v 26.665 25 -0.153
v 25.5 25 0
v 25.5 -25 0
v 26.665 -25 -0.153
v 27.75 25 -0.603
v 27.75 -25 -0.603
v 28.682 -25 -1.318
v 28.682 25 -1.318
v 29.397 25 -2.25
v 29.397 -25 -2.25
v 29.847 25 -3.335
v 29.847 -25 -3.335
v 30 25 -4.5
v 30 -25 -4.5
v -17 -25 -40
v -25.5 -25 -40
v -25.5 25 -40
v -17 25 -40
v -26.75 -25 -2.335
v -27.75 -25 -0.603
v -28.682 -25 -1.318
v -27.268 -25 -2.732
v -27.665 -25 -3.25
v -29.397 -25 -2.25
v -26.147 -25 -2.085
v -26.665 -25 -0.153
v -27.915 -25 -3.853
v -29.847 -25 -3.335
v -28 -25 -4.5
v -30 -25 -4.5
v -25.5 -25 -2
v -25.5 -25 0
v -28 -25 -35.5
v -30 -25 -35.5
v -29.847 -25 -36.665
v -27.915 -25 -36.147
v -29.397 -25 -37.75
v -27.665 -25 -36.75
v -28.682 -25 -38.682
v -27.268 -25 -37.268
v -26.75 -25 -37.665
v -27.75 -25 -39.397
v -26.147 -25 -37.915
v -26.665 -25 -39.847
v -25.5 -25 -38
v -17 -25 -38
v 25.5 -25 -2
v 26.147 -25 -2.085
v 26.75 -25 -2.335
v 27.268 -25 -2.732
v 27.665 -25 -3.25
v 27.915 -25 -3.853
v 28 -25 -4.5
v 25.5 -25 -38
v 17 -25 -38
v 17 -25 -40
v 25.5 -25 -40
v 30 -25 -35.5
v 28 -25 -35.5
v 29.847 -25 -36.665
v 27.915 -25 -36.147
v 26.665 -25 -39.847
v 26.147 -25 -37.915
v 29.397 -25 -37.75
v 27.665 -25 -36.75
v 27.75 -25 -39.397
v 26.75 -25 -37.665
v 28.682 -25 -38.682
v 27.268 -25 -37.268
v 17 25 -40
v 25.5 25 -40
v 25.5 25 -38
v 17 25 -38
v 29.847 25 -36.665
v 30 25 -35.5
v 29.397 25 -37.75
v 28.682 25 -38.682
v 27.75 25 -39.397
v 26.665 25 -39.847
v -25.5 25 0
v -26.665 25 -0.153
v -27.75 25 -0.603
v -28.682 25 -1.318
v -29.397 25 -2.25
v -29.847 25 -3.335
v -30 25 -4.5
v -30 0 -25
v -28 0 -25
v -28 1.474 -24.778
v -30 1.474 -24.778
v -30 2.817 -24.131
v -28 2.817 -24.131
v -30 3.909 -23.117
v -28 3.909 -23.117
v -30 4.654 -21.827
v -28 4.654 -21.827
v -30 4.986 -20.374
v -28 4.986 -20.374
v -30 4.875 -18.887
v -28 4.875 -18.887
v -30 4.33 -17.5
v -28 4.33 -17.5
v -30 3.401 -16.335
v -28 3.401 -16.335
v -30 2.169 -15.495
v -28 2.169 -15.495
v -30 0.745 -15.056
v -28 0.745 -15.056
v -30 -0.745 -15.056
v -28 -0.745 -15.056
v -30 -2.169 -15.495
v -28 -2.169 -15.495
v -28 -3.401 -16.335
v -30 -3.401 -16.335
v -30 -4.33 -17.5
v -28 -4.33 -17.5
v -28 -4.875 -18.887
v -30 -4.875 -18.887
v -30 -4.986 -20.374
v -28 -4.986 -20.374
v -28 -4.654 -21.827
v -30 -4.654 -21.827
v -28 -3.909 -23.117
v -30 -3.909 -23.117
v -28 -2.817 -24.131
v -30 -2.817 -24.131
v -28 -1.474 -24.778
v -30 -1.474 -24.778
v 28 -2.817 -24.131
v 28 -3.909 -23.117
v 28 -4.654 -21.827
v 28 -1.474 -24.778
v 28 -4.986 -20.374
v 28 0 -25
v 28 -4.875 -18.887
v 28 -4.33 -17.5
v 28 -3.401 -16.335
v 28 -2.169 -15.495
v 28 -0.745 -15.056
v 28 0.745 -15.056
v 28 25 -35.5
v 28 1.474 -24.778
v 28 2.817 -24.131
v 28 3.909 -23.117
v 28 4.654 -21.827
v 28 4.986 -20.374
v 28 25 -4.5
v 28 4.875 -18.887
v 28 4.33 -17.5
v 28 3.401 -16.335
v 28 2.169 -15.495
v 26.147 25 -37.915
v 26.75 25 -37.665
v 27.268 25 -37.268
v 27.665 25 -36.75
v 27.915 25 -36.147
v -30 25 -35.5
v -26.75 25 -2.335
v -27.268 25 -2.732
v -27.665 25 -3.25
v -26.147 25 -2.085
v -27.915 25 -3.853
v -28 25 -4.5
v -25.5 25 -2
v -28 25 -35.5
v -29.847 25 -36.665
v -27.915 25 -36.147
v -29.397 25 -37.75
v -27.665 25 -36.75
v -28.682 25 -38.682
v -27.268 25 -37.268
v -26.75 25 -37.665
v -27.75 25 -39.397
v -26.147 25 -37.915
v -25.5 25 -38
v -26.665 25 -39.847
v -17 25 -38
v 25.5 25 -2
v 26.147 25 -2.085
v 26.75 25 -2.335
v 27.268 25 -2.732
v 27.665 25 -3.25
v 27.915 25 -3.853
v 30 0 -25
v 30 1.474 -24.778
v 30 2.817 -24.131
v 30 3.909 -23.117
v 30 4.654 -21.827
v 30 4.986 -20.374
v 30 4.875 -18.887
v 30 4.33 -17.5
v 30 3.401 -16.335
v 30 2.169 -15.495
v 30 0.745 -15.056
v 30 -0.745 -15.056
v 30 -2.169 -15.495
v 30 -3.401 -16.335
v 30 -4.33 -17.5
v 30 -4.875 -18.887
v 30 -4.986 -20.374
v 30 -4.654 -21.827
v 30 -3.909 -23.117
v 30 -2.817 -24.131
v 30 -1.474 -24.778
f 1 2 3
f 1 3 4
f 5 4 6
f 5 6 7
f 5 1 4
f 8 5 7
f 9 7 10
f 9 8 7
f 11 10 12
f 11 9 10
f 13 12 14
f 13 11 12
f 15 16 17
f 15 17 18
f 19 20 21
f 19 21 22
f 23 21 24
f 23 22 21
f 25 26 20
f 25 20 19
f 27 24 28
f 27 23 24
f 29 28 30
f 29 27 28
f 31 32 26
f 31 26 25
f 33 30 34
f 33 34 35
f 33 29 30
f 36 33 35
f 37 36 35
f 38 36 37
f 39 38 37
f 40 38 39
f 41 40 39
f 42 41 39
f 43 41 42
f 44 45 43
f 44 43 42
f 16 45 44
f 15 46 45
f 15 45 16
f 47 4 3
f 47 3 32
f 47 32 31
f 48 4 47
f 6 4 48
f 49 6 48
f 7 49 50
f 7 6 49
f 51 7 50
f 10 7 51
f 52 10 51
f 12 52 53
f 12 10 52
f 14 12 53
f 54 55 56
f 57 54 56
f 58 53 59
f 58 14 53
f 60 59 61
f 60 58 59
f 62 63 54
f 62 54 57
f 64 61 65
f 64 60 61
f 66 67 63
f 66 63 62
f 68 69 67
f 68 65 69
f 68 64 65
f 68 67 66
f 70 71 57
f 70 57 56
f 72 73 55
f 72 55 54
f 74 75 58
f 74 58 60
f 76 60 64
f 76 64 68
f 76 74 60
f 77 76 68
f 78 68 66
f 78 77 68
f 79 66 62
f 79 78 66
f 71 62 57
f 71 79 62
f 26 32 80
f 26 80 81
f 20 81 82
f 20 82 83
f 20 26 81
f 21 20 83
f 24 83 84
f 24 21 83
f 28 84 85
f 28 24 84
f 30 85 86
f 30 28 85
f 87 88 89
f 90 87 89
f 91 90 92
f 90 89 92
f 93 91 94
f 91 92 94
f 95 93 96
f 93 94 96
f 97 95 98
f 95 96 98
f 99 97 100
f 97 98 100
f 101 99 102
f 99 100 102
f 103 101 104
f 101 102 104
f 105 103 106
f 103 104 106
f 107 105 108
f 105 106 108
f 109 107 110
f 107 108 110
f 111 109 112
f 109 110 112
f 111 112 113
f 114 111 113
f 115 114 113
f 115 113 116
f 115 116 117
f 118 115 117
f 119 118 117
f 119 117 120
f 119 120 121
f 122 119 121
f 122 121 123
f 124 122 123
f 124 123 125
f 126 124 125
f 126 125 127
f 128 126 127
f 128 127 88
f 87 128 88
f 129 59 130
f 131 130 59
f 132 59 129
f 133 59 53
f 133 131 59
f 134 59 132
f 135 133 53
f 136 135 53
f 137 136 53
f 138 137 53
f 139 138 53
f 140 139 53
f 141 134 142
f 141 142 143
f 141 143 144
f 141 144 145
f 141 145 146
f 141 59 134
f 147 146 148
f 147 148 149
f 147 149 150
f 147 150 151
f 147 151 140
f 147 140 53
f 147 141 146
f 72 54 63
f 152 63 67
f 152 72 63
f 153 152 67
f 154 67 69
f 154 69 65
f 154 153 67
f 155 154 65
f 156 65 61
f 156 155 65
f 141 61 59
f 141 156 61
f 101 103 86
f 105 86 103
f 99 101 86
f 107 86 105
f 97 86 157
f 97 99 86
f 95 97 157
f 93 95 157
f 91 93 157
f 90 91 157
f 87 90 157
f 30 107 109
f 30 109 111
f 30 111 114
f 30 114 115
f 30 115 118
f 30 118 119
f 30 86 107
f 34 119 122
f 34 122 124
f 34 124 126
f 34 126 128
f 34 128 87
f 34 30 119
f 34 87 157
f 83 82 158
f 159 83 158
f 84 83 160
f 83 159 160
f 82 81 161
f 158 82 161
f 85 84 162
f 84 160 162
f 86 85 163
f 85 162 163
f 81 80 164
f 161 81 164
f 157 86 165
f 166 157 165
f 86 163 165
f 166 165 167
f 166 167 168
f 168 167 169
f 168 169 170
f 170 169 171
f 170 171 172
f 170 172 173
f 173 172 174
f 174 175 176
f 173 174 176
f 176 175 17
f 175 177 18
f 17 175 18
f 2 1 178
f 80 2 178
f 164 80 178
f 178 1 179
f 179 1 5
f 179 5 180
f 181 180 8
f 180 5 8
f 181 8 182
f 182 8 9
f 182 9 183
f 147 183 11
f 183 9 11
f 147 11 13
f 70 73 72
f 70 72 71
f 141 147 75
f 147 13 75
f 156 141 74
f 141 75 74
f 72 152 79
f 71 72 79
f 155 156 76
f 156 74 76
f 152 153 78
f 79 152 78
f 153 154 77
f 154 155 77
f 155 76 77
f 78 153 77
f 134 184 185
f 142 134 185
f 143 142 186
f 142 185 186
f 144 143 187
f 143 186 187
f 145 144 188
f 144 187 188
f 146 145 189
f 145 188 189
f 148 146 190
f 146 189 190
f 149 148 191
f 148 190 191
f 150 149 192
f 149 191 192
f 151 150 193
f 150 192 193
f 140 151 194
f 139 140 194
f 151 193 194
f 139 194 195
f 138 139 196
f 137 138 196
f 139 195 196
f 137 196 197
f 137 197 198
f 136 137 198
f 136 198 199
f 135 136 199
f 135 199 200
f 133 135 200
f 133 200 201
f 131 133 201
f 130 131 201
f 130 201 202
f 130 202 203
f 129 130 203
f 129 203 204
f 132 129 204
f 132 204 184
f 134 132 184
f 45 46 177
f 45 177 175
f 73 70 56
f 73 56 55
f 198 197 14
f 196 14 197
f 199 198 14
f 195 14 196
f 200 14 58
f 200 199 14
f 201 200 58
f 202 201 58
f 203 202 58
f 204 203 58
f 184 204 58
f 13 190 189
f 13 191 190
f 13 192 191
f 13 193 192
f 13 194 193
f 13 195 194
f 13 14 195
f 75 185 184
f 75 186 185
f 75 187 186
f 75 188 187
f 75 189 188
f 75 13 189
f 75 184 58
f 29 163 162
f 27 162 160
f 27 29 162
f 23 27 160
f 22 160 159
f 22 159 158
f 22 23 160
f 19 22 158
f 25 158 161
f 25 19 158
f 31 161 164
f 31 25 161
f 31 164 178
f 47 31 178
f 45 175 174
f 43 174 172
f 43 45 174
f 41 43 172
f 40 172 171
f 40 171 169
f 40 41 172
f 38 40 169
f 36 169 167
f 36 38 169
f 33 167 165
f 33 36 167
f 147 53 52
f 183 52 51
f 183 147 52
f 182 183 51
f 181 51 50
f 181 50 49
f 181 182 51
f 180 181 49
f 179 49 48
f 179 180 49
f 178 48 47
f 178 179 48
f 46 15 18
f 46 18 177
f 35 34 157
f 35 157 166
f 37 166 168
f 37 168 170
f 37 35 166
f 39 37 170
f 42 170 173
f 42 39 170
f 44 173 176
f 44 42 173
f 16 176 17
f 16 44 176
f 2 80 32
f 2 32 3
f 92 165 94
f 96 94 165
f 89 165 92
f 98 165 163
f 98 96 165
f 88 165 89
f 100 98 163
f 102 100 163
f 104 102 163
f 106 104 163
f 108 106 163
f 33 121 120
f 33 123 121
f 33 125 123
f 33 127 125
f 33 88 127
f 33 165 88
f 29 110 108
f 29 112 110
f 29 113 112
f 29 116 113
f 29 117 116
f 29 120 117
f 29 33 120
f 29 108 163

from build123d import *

# Parameters (mm, degrees)
SKETCH1_W                      = 60
SKETCH1_H                      = 50
BASE_FLANGE1_DEPTH             = 2
EDGE_FLANGE1_STRIP_W           = 13
EDGE_FLANGE1_STRIP_H           = 2
EDGE_FLANGE1_STRIP_CUT_DEPTH   = 50
EDGE_FLANGE1_STRIP_2_W         = 13
EDGE_FLANGE1_STRIP_2_H         = 2
EDGE_FLANGE1_STRIP_CUT_2_DEPTH = 50
EDGE_FLANGE1_DEPTH             = 50
EDGE_FLANGE1_BEND_DEPTH        = 50
EDGE_FLANGE2_STRIP_W           = 13
EDGE_FLANGE2_STRIP_H           = 2
EDGE_FLANGE2_STRIP_CUT_DEPTH   = 50
EDGE_FLANGE2_STRIP_2_W         = 13
EDGE_FLANGE2_STRIP_2_H         = 2
EDGE_FLANGE2_STRIP_CUT_2_DEPTH = 50
EDGE_FLANGE2_DEPTH             = 50
EDGE_FLANGE2_BEND_DEPTH        = 50
SKETCH20_R                     = 5
CUT_EXTRUDE2_DEPTH             = 77.321687612


# Sheet-metal steps are written as plain solids
with BuildPart() as part:
    # Sketch1 → Base-Flange1 (new body)
    with BuildSketch(Plane.XY):
        Rectangle(SKETCH1_W, SKETCH1_H)
    extrude(amount=-BASE_FLANGE1_DEPTH)

    # Edge-Flange1 strip (across the edge) → Edge-Flange1 strip cut (cut)
    with BuildSketch(Plane(origin=(30, 25, -2), x_dir=(-1, 0, 0), z_dir=(0, -1, 0))):
        with Locations((-2, -1)):
            Rectangle(EDGE_FLANGE1_STRIP_W, EDGE_FLANGE1_STRIP_H)
    extrude(amount=EDGE_FLANGE1_STRIP_CUT_DEPTH, mode=Mode.SUBTRACT)

    # Edge-Flange1 strip 2 (across the edge) → Edge-Flange1 strip cut 2 (cut)
    with BuildSketch(Plane(origin=(-30, -25, -2), x_dir=(1, 0, 0), z_dir=(0, 1, 0))):
        with Locations((-2, -1)):
            Rectangle(EDGE_FLANGE1_STRIP_2_W, EDGE_FLANGE1_STRIP_2_H)
    extrude(amount=EDGE_FLANGE1_STRIP_CUT_2_DEPTH, mode=Mode.SUBTRACT)

    # Edge-Flange1 section (across the edge) → Edge-Flange1 (add)
    with BuildSketch(Plane(origin=(30, 25, -2), x_dir=(-1, 0, 0), z_dir=(0, -1, 0))):
        with BuildLine():
            Line((0, 2.5), (0, 38))
            Line((0, 38), (2, 38))
            Line((2, 38), (2, 2.5))
            ThreePointArc((2, 2.5), (2.732233047, 0.732233047), (4.5, 0))
            Line((4.5, 0), (4.5, -2))
            ThreePointArc((4.5, -2), (1.318019485, -0.681980515), (0, 2.5))
        make_face()
    extrude(amount=EDGE_FLANGE1_DEPTH)

    # Edge-Flange1 section 2 (across the edge) → Edge-Flange1 bend (add)
    with BuildSketch(Plane(origin=(-30, -25, -2), x_dir=(1, 0, 0), z_dir=(0, 1, 0))):
        with BuildLine():
            Line((0, 2.5), (0, 38))
            Line((0, 38), (2, 38))
            Line((2, 38), (2, 2.5))
            ThreePointArc((2, 2.5), (2.732233047, 0.732233047), (4.5, 0))
            Line((4.5, 0), (4.5, -2))
            ThreePointArc((4.5, -2), (1.318019485, -0.681980515), (0, 2.5))
        make_face()
    extrude(amount=EDGE_FLANGE1_BEND_DEPTH)

    # Edge-Flange2 strip (across the edge) → Edge-Flange2 strip cut (cut)
    with BuildSketch(Plane(origin=(28, 25, -40), x_dir=(0, 0, 1), z_dir=(0, -1, 0))):
        with Locations((-2, -1)):
            Rectangle(EDGE_FLANGE2_STRIP_W, EDGE_FLANGE2_STRIP_H)
    extrude(amount=EDGE_FLANGE2_STRIP_CUT_DEPTH, mode=Mode.SUBTRACT)

    # Edge-Flange2 strip 2 (across the edge) → Edge-Flange2 strip cut 2 (cut)
    with BuildSketch(Plane(origin=(-28, -25, -40), x_dir=(0, 0, 1), z_dir=(0, 1, 0))):
        with Locations((-2, -1)):
            Rectangle(EDGE_FLANGE2_STRIP_2_W, EDGE_FLANGE2_STRIP_2_H)
    extrude(amount=EDGE_FLANGE2_STRIP_CUT_2_DEPTH, mode=Mode.SUBTRACT)

    # Edge-Flange2 section (across the edge) → Edge-Flange2 (add)
    with BuildSketch(Plane(origin=(28, 25, -40), x_dir=(0, 0, 1), z_dir=(0, -1, 0))):
        with BuildLine():
            Line((0, 2.5), (0, 11))
            Line((0, 11), (2, 11))
            Line((2, 11), (2, 2.5))
            ThreePointArc((2, 2.5), (2.732233047, 0.732233047), (4.5, 0))
            Line((4.5, 0), (4.5, -2))
            ThreePointArc((4.5, -2), (1.318019485, -0.681980515), (0, 2.5))
        make_face()
    extrude(amount=EDGE_FLANGE2_DEPTH)

    # Edge-Flange2 section 2 (across the edge) → Edge-Flange2 bend (add)
    with BuildSketch(Plane(origin=(-28, -25, -40), x_dir=(0, 0, 1), z_dir=(0, 1, 0))):
        with BuildLine():
            Line((0, 2.5), (0, 11))
            Line((0, 11), (2, 11))
            Line((2, 11), (2, 2.5))
            ThreePointArc((2, 2.5), (2.732233047, 0.732233047), (4.5, 0))
            Line((4.5, 0), (4.5, -2))
            ThreePointArc((4.5, -2), (1.318019485, -0.681980515), (0, 2.5))
        make_face()
    extrude(amount=EDGE_FLANGE2_BEND_DEPTH)

    # Sketch20 → Cut-Extrude2 (cut, through all)
    with BuildSketch(Plane(origin=(30, 0, 0), x_dir=(0, 0, -1), z_dir=(1, 0, 0))):
        with Locations((20, 0)):
            Circle(SKETCH20_R)
    extrude(amount=-CUT_EXTRUDE2_DEPTH, mode=Mode.SUBTRACT)


solid = part.part
